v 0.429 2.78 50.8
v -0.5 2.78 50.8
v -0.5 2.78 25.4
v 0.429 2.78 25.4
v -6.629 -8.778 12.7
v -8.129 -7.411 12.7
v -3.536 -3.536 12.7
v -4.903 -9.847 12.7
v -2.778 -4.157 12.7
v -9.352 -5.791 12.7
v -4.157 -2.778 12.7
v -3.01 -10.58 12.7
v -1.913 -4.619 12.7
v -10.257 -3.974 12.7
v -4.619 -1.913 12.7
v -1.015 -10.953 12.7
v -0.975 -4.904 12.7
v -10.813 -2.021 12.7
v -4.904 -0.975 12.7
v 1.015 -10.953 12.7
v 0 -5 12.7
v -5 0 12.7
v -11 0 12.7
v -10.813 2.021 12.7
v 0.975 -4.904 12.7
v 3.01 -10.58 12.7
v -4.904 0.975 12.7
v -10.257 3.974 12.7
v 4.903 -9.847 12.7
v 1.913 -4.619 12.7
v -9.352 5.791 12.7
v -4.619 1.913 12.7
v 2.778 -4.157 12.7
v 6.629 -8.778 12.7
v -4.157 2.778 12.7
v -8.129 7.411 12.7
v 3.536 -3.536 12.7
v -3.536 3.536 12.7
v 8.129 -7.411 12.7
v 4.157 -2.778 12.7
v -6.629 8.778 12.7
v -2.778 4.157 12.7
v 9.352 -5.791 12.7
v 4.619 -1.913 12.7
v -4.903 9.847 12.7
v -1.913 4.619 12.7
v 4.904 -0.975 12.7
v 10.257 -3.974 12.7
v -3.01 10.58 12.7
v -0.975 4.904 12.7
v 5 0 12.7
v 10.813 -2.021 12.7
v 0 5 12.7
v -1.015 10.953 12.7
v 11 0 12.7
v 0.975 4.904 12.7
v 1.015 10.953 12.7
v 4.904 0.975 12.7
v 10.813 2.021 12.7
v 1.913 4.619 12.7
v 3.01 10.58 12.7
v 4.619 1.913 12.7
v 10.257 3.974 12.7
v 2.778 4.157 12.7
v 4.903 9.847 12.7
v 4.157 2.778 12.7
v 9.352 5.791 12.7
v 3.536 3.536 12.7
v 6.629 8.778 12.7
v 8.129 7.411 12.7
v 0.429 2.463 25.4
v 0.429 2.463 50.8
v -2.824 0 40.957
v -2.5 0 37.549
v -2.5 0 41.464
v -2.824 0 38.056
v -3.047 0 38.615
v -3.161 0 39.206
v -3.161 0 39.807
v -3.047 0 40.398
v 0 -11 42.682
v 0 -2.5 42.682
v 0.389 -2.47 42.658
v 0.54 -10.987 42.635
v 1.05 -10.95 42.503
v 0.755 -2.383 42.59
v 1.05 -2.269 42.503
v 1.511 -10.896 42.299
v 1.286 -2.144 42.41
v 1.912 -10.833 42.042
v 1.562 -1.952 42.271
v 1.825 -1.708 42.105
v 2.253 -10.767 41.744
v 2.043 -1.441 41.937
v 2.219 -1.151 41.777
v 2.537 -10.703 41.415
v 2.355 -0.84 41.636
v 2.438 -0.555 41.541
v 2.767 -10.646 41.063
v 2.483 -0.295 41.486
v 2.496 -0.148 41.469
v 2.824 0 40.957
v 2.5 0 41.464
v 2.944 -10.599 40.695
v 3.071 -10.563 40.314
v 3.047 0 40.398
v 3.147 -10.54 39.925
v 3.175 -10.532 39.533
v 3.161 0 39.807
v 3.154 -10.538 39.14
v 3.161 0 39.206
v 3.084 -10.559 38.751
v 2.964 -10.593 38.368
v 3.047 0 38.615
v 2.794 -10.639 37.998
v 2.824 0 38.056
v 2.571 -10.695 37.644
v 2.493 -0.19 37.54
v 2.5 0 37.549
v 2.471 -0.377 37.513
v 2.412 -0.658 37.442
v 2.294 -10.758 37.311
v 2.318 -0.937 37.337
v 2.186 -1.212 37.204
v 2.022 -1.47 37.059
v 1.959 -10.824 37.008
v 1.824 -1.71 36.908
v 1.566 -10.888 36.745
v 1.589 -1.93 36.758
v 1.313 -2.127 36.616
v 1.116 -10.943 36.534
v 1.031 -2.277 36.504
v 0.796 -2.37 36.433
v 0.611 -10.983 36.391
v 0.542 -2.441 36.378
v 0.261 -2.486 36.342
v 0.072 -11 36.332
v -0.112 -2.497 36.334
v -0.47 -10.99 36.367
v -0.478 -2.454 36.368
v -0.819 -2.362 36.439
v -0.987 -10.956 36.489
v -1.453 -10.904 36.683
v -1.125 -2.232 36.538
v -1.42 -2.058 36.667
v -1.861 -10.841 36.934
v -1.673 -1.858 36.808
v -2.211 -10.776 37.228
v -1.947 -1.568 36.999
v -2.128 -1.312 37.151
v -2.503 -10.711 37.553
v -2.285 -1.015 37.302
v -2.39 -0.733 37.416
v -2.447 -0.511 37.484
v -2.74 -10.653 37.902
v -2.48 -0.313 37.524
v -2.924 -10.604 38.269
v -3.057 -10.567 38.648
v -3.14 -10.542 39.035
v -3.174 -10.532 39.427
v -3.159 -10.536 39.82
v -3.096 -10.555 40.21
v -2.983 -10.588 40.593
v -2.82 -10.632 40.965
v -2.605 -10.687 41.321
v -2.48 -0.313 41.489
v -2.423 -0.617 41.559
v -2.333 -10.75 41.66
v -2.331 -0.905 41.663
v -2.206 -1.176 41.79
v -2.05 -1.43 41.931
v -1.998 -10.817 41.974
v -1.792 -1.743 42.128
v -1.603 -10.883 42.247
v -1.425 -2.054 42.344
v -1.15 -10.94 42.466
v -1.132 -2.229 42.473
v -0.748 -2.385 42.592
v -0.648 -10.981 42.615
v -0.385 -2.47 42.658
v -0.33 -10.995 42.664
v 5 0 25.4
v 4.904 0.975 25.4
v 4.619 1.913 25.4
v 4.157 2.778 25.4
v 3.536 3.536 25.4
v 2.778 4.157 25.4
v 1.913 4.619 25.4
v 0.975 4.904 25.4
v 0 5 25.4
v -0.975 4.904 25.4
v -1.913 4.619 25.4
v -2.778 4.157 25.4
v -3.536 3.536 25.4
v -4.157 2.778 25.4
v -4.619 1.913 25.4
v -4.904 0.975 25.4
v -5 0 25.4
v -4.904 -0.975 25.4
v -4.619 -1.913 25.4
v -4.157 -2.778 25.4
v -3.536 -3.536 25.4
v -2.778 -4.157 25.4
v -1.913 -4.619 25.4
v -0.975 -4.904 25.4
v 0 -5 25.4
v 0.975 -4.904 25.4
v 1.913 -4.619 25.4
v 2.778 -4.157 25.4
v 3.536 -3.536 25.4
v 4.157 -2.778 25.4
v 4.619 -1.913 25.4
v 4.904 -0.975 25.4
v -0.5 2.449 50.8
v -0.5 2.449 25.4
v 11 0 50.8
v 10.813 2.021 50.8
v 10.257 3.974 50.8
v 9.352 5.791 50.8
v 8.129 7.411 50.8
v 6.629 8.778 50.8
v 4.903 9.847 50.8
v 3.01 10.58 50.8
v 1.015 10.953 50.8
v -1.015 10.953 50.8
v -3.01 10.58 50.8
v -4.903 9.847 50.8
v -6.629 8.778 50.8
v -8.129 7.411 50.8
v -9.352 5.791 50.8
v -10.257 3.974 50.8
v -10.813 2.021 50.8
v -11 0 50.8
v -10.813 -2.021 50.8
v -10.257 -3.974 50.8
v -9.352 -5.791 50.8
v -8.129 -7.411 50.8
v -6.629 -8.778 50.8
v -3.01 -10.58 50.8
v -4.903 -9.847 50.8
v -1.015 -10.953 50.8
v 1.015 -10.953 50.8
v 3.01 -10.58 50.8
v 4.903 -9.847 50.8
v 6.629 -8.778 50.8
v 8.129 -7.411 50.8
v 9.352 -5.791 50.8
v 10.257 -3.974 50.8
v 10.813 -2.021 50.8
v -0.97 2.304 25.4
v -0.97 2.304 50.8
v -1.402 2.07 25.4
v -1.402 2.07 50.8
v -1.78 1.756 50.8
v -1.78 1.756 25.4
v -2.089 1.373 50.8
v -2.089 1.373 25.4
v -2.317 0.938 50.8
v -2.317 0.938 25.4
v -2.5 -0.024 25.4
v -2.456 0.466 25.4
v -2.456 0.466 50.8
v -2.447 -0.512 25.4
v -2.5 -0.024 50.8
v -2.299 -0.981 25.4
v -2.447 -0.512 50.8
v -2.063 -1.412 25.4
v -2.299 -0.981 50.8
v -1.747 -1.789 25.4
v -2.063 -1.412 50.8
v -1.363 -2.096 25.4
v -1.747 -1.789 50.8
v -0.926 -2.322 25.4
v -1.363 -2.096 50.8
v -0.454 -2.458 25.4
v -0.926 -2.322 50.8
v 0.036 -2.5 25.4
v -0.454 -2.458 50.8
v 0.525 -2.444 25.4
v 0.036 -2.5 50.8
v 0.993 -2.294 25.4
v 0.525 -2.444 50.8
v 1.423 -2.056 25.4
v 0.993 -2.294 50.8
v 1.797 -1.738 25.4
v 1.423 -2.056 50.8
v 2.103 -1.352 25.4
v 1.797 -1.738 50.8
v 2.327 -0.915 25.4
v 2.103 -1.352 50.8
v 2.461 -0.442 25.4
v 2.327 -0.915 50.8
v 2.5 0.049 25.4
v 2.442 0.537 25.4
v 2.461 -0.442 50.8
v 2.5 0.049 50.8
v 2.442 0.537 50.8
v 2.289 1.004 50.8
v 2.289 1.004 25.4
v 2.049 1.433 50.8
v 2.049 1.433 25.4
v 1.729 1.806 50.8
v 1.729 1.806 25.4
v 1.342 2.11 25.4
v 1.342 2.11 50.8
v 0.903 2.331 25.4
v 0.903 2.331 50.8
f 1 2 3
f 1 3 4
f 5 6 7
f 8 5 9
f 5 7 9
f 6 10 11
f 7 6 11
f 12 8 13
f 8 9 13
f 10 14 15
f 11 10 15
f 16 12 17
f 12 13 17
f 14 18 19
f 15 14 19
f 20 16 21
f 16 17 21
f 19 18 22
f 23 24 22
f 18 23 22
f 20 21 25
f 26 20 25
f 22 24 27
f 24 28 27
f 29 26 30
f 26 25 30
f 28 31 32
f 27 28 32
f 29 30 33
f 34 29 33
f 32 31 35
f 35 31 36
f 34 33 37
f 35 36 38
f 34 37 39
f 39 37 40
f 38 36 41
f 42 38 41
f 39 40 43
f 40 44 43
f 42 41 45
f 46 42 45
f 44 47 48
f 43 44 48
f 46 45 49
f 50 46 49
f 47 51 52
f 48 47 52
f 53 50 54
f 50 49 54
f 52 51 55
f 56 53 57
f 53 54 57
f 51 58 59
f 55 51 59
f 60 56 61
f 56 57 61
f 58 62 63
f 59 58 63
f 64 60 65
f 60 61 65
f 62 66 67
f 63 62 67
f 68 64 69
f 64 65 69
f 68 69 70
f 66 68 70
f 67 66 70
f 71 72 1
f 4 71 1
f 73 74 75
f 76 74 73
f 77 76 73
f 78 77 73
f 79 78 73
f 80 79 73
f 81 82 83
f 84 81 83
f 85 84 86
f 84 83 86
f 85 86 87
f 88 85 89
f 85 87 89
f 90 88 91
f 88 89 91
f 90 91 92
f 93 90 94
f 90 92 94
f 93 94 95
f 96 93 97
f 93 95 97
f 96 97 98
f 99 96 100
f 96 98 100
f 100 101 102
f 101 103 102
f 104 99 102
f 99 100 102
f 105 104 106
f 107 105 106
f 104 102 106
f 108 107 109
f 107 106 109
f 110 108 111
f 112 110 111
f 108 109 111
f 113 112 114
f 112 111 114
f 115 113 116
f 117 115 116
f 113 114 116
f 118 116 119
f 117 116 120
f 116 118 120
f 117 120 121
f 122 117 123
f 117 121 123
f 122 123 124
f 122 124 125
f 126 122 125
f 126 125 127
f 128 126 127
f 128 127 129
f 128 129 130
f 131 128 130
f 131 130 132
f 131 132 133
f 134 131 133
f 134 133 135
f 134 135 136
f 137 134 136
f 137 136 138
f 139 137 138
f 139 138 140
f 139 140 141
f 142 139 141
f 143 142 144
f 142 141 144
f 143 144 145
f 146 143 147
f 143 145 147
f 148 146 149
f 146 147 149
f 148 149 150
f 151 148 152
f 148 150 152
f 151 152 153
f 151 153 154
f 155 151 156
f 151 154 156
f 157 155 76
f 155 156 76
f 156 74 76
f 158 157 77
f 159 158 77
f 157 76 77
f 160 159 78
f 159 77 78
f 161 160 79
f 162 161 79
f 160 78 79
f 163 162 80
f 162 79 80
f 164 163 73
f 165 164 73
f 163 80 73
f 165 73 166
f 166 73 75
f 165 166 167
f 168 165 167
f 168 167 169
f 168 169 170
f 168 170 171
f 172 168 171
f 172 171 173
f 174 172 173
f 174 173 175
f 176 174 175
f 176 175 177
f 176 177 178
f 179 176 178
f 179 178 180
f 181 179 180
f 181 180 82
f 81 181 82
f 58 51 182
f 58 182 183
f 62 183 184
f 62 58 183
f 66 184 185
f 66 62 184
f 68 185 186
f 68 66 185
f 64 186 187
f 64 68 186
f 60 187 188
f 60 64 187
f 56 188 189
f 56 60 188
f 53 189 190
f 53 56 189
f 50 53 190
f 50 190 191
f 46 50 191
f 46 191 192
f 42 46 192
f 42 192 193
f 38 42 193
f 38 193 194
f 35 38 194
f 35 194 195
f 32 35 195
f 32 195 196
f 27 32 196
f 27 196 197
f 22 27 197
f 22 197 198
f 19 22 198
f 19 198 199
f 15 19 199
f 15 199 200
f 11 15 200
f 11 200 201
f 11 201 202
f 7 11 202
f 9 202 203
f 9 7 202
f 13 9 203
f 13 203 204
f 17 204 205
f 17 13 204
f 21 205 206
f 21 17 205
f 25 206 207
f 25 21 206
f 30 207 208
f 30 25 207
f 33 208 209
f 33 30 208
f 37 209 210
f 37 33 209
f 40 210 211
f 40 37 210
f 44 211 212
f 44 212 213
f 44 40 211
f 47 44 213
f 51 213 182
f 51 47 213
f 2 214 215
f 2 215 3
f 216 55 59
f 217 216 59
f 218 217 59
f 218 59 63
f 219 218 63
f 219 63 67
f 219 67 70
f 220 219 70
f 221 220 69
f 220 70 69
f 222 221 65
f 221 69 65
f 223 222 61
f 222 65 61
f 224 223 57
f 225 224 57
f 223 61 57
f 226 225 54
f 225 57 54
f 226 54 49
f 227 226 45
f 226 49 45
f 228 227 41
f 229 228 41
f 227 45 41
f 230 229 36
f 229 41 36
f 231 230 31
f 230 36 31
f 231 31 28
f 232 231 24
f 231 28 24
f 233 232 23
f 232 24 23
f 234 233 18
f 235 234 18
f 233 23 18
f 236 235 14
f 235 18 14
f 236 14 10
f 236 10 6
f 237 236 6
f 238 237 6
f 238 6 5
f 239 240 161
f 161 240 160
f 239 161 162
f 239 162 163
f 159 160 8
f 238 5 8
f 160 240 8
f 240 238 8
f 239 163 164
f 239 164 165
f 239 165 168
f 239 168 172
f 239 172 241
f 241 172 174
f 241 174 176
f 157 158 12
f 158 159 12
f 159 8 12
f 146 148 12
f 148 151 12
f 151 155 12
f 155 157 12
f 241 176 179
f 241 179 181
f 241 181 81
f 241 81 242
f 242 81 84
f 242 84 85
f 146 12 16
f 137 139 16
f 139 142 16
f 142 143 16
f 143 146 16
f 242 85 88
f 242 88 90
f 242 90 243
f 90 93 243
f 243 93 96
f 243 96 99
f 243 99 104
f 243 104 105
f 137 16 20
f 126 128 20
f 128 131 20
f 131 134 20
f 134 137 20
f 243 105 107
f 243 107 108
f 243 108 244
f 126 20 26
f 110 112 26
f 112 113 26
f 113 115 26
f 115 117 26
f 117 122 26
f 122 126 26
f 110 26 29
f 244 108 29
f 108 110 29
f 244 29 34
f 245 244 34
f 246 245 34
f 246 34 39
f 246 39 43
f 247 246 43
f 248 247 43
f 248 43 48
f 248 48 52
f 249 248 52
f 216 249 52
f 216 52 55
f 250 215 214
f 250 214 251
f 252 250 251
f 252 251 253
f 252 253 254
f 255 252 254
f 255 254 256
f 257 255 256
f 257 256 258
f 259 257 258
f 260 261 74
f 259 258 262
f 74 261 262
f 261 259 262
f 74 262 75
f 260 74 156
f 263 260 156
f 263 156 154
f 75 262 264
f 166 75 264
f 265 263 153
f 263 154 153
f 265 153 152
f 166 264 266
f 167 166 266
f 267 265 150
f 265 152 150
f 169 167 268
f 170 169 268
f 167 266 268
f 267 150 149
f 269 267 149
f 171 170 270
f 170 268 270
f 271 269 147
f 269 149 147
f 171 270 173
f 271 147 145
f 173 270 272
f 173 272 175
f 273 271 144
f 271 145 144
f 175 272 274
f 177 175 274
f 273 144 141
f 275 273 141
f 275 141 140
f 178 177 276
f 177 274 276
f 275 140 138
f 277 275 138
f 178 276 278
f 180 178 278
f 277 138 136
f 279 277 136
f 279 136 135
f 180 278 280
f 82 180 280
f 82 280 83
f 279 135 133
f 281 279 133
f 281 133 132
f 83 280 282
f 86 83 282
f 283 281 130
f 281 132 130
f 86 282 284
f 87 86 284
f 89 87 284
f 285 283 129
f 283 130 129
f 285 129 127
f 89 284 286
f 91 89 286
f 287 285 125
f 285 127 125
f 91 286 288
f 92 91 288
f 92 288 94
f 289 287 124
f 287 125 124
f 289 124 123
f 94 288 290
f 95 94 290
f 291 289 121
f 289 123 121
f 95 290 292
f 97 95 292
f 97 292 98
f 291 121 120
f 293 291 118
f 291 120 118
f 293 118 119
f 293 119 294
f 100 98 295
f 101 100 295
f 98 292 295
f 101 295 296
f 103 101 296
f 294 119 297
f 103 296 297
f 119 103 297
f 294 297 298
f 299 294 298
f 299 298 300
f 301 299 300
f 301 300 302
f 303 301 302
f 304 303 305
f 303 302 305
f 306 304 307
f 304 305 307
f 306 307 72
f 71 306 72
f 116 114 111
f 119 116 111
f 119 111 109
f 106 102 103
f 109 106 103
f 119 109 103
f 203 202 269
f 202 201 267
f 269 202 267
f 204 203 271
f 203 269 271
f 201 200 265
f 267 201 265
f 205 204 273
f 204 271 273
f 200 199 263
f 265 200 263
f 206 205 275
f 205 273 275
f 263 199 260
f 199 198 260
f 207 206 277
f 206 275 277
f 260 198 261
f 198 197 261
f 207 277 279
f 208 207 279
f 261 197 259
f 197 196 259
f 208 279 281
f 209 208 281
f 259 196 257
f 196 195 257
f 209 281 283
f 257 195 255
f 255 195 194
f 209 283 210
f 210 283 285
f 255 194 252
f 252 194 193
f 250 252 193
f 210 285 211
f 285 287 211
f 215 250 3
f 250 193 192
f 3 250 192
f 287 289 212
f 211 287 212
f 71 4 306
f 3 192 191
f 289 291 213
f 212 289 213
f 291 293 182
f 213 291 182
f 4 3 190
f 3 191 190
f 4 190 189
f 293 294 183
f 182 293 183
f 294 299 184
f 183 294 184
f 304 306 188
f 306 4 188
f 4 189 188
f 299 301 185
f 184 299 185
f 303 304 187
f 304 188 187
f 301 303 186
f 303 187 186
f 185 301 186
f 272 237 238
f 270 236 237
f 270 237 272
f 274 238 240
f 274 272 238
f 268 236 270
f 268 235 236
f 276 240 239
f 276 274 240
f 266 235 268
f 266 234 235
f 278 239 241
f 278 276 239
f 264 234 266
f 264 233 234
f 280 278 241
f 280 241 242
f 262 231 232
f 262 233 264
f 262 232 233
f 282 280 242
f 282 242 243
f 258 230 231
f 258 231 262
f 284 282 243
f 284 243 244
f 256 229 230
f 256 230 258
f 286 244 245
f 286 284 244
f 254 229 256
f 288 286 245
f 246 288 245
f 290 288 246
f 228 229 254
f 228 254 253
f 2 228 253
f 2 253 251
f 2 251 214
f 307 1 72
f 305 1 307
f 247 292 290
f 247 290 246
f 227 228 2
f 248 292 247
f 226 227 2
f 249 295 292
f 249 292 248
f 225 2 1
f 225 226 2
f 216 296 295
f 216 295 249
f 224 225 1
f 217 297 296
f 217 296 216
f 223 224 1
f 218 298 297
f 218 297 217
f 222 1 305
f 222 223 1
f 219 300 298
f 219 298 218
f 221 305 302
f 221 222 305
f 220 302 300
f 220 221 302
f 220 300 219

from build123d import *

# Parameters (mm, degrees)
SKETCH15_R               = 11
BOSS_EXTRUDE4_DEPTH      = 50.8
CUT_EXTRUDE9_DEPTH       = 25.4
CUT_EXTRUDE9_DEPTH_BACK  = 50.8
SKETCH16_R               = 5
SKETCH17_R               = 2.5
CUT_EXTRUDE10_DEPTH      = 25.4
SKETCH20_W               = 0.929150013
SKETCH20_H               = 0.563484587
CUT_EXTRUDE11_DEPTH      = 25.4
SKETCH22_R               = 3.175
CUT_EXTRUDE14_DEPTH      = 12
CUT_EXTRUDE15_DEPTH      = 12.7
CUT_EXTRUDE15_DEPTH_BACK = 10
SKETCH33_R               = 11


with BuildPart() as part:
    # Sketch15 → Boss-Extrude4 (new body)
    with BuildSketch(Plane.XY):
        Circle(SKETCH15_R)
    extrude(amount=BOSS_EXTRUDE4_DEPTH)

    # Sketch16 → Cut-Extrude9 (cut, two sides: drawn at the far end of the back side and taken through both)
    with BuildSketch(Plane.XY.offset(-CUT_EXTRUDE9_DEPTH_BACK)):
        Circle(SKETCH16_R)
    extrude(amount=CUT_EXTRUDE9_DEPTH + CUT_EXTRUDE9_DEPTH_BACK, mode=Mode.SUBTRACT)

    # Sketch17 → Cut-Extrude10 (cut)
    with BuildSketch(Plane.XY.offset(50.8)):
        Circle(SKETCH17_R)
    extrude(amount=-CUT_EXTRUDE10_DEPTH, mode=Mode.SUBTRACT)

    # Sketch20 → Cut-Extrude11 (cut)
    with BuildSketch(Plane.XY.offset(50.8)):
        with Locations((-0.035424993, 2.498467219)):
            Rectangle(SKETCH20_W, SKETCH20_H)
    extrude(amount=-CUT_EXTRUDE11_DEPTH, mode=Mode.SUBTRACT)

    # Sketch22 → Cut-Extrude14 (cut)
    with BuildSketch(Plane(origin=(0, 0, 0), x_dir=(1, 0, 0), z_dir=(0, 1, 0))):
        with Locations(Location((0, -39.506560459, 0), (0, 0, 270))):
            Circle(SKETCH22_R)
    extrude(amount=-CUT_EXTRUDE14_DEPTH, mode=Mode.SUBTRACT)

    # Sketch33 → Cut-Extrude15 (cut, two sides: drawn at the far end of the back side and taken through both)
    with BuildSketch(Plane.XY.offset(-CUT_EXTRUDE15_DEPTH_BACK)):
        Circle(SKETCH33_R)
    extrude(amount=CUT_EXTRUDE15_DEPTH + CUT_EXTRUDE15_DEPTH_BACK, mode=Mode.SUBTRACT)


solid = part.part
